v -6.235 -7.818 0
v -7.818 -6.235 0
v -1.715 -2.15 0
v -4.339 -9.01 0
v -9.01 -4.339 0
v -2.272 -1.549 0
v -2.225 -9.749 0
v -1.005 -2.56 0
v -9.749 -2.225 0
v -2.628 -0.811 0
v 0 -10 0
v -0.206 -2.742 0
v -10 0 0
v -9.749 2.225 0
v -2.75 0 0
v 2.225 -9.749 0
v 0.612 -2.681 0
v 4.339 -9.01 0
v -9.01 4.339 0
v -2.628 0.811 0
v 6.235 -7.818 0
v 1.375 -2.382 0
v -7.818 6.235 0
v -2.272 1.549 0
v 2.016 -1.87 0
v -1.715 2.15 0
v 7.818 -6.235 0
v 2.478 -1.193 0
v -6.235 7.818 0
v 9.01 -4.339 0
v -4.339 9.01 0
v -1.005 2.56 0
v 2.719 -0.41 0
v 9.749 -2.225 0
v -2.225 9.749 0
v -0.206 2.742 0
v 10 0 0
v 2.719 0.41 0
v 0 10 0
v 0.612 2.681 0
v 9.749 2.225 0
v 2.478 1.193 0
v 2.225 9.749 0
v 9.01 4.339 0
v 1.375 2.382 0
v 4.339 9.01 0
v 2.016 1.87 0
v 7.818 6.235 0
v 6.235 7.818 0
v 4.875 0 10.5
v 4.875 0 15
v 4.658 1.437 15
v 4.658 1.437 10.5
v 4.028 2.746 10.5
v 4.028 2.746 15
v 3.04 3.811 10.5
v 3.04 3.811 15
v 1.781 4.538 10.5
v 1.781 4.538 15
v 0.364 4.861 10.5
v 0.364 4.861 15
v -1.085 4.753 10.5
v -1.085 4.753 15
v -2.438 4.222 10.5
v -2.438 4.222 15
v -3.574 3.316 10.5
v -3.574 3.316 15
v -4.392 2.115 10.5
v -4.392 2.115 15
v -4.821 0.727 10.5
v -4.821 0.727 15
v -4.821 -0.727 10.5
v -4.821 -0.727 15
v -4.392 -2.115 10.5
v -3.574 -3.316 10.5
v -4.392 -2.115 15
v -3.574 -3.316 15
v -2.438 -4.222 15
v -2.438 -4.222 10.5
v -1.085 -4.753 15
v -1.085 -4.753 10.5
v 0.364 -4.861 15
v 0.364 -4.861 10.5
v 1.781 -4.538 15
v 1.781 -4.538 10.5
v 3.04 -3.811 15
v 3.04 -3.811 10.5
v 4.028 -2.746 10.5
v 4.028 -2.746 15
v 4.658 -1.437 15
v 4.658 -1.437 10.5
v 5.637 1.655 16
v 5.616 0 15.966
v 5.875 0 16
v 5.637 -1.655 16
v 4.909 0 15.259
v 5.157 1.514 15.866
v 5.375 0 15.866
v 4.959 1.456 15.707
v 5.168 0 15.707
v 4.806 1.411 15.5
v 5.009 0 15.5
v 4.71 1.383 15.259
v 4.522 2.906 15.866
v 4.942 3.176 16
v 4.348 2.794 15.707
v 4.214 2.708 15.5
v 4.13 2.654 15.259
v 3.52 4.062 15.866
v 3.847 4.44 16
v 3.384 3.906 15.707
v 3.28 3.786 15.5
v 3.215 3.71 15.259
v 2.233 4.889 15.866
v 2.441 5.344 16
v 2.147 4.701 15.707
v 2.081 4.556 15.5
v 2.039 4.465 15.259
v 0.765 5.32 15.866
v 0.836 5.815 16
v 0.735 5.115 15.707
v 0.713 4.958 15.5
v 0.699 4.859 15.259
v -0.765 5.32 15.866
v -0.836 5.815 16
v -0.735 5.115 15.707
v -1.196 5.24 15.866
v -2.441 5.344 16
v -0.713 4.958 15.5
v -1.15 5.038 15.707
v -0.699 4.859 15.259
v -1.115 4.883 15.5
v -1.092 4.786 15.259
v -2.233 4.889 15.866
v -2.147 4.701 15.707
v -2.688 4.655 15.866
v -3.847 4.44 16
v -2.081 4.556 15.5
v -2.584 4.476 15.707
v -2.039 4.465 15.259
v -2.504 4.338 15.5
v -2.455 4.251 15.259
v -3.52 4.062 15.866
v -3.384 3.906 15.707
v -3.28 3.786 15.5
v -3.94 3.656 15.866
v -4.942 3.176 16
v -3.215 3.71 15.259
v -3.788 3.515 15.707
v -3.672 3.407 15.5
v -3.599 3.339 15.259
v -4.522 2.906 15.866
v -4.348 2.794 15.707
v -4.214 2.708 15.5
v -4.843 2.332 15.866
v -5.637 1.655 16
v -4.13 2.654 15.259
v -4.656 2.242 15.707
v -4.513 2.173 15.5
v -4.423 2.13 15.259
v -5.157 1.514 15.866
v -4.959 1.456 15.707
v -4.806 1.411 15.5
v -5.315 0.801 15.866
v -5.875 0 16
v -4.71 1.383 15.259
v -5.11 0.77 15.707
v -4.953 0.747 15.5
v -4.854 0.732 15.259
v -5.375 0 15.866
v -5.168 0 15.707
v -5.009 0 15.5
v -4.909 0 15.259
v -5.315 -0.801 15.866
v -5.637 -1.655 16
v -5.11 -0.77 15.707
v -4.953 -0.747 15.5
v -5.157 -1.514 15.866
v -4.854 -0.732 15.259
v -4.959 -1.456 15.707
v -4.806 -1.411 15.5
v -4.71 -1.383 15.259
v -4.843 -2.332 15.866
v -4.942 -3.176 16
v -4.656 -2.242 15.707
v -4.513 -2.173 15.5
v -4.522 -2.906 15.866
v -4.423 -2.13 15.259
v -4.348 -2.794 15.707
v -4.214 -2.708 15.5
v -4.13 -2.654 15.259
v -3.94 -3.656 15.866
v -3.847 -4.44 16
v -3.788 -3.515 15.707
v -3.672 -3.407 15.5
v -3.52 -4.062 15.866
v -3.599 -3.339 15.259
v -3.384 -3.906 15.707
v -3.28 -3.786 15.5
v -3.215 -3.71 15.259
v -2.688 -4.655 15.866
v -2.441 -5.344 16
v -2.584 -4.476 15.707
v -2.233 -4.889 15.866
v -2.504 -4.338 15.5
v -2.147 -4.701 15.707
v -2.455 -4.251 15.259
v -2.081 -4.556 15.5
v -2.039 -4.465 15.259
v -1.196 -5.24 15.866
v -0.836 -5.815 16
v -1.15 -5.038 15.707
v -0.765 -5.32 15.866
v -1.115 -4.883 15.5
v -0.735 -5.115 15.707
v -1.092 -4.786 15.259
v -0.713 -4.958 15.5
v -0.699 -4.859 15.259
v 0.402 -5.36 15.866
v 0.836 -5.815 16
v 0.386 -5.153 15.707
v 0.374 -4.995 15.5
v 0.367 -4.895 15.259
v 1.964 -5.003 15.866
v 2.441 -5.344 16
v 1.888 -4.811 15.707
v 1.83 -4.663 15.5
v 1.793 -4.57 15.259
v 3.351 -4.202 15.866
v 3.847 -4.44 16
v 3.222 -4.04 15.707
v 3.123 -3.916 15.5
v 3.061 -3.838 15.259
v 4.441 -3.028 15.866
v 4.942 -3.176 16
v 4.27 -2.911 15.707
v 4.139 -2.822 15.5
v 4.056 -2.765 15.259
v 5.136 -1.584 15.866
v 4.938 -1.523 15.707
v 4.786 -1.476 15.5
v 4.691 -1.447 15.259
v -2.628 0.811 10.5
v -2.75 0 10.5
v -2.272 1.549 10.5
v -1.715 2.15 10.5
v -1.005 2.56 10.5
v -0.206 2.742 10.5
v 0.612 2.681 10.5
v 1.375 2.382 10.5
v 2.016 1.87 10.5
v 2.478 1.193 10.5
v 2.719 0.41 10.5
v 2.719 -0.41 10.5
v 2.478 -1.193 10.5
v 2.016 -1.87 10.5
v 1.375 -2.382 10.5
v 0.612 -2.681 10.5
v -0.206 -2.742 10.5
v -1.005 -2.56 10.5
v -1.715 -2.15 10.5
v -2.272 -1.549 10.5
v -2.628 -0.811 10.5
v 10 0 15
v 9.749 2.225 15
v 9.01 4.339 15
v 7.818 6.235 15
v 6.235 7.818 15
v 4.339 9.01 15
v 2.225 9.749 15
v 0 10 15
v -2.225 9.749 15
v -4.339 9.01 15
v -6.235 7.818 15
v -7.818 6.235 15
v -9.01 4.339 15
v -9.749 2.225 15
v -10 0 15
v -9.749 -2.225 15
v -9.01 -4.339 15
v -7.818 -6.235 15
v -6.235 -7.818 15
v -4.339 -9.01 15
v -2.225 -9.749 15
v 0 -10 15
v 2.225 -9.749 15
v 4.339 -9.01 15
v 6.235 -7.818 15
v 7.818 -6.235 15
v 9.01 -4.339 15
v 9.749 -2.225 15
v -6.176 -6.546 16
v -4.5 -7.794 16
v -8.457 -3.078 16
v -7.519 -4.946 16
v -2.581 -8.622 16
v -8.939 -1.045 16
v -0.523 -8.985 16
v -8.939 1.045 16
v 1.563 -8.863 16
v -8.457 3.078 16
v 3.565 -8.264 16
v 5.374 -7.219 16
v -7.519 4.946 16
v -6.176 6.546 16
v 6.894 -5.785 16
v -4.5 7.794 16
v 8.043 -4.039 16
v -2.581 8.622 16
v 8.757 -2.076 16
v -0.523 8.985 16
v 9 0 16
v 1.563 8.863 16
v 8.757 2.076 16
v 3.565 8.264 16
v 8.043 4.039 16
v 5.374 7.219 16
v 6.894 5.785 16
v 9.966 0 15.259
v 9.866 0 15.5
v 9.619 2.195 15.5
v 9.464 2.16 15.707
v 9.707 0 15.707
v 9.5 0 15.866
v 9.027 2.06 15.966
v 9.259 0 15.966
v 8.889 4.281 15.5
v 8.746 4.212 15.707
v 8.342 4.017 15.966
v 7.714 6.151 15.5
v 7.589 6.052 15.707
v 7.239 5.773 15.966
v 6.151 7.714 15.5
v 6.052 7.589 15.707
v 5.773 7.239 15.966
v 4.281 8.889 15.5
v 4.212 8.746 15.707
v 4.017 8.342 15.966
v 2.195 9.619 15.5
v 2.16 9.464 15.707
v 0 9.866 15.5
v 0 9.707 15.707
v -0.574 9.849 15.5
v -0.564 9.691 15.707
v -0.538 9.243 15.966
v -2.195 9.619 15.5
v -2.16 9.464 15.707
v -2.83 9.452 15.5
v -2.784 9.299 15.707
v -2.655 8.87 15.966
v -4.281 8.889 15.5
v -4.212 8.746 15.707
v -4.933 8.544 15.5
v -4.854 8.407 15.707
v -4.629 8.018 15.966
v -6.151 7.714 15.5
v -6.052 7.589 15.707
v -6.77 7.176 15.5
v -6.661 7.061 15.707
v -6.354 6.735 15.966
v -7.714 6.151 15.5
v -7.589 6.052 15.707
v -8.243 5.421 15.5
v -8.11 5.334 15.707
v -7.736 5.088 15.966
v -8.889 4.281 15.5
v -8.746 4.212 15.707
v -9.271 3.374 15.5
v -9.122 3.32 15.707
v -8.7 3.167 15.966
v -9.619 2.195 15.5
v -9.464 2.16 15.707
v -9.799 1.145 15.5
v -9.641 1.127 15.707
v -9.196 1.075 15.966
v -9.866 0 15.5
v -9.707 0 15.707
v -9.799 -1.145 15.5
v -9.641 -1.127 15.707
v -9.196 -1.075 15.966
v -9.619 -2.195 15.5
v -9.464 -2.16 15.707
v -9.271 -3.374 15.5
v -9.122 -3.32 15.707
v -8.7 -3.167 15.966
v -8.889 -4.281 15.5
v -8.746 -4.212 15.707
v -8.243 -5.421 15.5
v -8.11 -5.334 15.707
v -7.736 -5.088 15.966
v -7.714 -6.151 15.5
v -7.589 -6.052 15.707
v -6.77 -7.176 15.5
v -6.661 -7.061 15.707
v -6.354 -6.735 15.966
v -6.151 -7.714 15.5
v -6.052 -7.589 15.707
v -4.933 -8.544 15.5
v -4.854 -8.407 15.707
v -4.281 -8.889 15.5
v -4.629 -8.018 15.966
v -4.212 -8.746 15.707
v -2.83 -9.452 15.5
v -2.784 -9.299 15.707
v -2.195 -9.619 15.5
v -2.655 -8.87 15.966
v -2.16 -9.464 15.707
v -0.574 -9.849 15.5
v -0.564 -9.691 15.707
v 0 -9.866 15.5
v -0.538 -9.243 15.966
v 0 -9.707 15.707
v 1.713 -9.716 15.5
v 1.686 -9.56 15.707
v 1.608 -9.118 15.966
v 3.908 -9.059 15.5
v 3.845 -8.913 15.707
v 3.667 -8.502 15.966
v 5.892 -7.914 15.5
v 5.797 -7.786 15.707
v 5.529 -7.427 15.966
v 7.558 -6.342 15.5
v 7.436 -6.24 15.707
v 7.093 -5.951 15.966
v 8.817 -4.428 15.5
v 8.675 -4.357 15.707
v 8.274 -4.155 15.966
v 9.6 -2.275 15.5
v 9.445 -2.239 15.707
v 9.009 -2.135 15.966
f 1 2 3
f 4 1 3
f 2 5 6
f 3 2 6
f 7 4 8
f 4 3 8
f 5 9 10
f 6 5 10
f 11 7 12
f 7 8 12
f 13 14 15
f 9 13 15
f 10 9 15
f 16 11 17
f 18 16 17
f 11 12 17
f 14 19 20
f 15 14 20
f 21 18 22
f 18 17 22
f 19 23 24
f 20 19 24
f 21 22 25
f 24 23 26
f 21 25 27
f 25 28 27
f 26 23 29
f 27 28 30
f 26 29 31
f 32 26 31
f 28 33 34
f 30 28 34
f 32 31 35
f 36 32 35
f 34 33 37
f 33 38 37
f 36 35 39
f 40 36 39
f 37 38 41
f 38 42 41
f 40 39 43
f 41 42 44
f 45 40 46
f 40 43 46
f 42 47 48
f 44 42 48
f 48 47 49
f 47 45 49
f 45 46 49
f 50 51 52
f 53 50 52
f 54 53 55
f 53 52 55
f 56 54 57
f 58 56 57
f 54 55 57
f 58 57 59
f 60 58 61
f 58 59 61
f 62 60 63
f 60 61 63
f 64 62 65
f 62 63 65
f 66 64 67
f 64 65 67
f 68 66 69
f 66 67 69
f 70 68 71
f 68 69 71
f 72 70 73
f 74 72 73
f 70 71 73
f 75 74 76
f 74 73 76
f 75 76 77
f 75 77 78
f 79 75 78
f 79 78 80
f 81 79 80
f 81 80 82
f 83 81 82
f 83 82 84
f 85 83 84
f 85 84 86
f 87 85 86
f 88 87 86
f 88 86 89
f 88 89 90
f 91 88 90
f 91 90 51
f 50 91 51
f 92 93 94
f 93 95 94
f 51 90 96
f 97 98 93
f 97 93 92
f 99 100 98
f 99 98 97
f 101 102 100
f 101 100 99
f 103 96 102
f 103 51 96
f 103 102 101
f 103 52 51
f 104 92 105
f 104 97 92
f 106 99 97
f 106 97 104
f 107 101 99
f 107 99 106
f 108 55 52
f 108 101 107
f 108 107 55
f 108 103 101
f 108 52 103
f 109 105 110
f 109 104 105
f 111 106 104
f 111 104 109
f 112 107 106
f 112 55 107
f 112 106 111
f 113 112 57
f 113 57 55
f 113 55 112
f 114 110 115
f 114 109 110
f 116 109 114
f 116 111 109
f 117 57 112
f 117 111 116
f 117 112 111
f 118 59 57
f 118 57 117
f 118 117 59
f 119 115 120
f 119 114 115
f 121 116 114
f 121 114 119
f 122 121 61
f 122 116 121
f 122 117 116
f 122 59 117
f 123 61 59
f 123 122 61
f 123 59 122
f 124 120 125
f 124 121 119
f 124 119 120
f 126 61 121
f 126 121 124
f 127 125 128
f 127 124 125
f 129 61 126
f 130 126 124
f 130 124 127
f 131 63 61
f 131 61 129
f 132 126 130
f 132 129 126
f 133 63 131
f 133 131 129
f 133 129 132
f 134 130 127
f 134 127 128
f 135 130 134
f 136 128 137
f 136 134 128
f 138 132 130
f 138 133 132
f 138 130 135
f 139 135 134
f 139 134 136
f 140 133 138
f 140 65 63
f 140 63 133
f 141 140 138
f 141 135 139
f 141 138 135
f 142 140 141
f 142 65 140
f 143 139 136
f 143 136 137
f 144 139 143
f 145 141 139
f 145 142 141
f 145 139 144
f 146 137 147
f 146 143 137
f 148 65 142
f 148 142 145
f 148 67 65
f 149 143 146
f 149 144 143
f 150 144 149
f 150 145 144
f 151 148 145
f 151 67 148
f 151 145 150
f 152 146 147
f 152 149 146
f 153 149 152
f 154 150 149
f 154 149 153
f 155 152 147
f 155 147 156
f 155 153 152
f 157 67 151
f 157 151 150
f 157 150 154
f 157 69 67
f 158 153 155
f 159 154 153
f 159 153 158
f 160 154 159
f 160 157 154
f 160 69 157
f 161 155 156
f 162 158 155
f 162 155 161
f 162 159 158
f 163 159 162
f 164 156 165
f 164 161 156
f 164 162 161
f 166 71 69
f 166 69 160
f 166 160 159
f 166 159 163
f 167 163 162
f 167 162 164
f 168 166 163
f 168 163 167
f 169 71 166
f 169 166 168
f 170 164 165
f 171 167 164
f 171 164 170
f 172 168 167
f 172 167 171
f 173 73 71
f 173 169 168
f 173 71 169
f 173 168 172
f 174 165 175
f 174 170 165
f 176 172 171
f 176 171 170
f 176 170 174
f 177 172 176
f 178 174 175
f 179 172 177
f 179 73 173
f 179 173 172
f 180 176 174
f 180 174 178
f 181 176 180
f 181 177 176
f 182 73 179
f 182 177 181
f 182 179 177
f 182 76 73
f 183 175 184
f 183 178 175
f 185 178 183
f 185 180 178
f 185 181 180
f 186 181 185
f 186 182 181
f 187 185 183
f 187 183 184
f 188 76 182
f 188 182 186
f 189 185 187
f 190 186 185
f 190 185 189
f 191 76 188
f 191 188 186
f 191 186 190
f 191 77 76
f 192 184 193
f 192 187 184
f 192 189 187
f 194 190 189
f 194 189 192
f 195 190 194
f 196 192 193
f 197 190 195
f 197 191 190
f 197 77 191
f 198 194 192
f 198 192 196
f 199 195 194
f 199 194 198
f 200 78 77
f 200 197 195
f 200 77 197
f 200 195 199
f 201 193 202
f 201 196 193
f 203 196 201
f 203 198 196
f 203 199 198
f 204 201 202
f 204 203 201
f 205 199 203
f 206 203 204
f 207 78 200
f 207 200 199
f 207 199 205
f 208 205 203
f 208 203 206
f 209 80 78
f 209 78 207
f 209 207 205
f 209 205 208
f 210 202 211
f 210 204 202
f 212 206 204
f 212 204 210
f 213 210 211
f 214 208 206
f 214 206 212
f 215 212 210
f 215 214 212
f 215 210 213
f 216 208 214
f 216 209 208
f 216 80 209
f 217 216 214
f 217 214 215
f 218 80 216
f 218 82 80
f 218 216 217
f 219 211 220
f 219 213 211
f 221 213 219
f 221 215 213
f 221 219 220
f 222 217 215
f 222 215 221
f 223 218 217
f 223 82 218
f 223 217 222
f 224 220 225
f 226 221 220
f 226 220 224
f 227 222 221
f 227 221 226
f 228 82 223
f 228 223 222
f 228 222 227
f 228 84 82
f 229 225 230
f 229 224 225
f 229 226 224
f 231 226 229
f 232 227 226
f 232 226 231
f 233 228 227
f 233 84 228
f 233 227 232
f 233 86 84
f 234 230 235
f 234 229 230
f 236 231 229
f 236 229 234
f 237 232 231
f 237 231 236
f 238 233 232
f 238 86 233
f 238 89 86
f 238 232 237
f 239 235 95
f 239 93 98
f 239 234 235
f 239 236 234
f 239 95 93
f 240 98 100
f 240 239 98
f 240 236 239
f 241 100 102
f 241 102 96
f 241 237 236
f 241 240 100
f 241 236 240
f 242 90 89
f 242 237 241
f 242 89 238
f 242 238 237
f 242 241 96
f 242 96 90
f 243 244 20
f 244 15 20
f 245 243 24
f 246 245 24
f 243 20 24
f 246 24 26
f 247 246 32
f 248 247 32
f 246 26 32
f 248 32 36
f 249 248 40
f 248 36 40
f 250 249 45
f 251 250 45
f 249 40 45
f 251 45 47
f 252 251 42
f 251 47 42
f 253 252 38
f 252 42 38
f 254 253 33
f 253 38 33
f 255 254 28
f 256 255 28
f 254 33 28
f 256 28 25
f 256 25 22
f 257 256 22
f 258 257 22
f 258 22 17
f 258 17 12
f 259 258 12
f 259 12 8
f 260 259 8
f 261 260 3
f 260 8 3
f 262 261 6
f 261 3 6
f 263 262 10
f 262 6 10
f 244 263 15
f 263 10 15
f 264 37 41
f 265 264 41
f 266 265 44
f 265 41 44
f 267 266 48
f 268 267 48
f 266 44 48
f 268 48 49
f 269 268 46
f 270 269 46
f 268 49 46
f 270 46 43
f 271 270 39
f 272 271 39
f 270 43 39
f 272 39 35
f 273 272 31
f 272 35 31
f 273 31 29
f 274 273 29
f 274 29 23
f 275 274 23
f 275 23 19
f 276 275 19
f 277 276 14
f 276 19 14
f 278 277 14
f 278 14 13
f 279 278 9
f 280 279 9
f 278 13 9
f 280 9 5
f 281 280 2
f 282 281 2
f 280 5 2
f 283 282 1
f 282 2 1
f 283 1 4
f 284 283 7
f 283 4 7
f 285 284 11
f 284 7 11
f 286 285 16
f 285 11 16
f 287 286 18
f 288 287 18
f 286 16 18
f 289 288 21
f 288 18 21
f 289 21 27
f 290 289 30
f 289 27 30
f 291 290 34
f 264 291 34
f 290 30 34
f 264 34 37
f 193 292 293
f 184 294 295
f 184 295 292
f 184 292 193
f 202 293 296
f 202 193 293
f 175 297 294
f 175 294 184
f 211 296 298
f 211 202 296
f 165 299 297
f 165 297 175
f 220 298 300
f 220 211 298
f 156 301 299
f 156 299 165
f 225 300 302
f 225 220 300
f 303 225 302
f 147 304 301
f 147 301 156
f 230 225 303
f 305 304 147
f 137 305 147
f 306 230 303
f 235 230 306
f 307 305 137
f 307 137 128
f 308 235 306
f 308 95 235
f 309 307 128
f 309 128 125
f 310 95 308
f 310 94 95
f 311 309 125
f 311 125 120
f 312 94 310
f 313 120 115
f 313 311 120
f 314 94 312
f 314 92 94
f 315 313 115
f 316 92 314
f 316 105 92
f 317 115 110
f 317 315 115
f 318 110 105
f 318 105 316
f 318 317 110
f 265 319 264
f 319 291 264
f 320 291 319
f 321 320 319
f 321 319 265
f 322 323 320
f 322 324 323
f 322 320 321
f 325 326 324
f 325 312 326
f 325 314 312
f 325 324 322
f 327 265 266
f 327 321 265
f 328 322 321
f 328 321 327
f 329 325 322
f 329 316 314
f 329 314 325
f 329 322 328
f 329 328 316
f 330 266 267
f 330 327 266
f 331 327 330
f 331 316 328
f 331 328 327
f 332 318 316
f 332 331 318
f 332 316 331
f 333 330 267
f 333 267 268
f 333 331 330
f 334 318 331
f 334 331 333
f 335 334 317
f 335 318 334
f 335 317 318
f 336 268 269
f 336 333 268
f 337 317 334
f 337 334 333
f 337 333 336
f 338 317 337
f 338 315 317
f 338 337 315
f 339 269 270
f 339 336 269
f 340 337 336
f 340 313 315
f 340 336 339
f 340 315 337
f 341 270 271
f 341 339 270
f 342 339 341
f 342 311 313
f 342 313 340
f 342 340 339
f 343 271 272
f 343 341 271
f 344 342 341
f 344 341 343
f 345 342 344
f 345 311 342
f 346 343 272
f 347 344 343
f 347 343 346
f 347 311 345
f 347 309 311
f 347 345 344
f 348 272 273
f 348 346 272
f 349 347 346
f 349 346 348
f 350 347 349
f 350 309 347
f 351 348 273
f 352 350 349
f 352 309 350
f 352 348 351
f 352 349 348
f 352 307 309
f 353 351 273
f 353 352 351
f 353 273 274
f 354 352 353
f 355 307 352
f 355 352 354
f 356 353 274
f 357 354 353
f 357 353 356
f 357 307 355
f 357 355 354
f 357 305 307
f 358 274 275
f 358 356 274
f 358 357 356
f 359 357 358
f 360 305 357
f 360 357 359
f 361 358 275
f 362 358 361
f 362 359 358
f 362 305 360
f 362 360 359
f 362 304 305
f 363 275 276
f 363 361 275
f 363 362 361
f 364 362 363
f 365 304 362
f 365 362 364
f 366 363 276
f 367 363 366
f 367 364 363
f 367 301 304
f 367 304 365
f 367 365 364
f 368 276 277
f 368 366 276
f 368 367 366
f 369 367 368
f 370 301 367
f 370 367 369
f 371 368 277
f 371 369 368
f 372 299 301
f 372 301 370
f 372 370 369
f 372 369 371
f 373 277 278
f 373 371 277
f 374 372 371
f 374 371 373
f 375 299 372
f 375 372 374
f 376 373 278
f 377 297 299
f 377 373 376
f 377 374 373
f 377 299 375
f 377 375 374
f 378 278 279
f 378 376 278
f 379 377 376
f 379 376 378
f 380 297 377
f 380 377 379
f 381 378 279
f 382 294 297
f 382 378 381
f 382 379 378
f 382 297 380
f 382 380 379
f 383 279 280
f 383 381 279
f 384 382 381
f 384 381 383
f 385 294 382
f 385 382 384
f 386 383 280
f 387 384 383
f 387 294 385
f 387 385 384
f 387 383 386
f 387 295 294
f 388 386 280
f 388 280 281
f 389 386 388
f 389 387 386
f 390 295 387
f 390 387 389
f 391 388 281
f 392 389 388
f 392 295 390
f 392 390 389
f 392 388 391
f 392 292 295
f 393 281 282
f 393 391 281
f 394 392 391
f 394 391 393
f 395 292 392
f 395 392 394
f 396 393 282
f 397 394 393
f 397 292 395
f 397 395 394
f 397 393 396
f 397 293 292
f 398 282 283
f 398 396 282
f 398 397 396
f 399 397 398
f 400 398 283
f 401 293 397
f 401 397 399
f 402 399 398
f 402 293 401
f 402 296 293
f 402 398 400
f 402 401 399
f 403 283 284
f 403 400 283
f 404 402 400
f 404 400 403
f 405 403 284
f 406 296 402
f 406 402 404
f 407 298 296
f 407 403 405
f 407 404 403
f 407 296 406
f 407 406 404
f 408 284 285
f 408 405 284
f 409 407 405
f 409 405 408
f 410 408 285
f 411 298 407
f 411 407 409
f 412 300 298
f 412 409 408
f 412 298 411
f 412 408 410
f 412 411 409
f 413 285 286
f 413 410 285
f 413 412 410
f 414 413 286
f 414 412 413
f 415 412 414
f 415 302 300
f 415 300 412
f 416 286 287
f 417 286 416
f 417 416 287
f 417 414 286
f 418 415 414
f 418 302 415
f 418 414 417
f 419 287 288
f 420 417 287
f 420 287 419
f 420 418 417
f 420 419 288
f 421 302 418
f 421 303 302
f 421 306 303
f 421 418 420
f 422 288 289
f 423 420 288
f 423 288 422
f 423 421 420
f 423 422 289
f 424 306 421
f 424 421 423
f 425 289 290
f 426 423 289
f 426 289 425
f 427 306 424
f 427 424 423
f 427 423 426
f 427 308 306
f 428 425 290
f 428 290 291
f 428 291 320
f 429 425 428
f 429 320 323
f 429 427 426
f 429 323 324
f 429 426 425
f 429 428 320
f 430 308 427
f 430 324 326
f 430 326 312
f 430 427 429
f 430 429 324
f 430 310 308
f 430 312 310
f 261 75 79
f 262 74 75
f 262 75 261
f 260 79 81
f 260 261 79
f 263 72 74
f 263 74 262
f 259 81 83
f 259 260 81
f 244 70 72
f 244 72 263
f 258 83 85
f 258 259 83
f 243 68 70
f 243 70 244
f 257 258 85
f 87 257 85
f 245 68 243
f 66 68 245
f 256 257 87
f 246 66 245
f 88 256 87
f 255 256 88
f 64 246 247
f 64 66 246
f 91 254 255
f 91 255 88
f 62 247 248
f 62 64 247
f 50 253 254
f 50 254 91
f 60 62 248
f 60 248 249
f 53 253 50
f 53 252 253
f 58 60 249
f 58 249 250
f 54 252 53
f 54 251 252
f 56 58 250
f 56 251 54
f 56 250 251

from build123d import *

# Parameters (mm, degrees)
F0_R           = 10
F1_DEPTH       = 16
F3_D           = 5.5
F3_CBORE_D     = 9.75
F3_CBORE_DEPTH = 5.5
F4_R           = 1


with BuildPart() as f1:
    # F0 (on Top) → F1 (new body)
    with BuildSketch(Plane.XY):
        Circle(F0_R)
    extrude(amount=F1_DEPTH)

    # F3 (through all)
    with Locations(Plane.XY.offset(16)):
        with Locations((0, 0)):
            CounterBoreHole(F3_D / 2, F3_CBORE_D / 2, F3_CBORE_DEPTH)

    # F4
    f4_edges = [f1.edges().sort_by_distance(p)[0] for p in [
        (-10, 0, 16),
        (-4.875, 0, 16),
    ]]
    fillet(f4_edges, radius=F4_R)


solid = f1.part
